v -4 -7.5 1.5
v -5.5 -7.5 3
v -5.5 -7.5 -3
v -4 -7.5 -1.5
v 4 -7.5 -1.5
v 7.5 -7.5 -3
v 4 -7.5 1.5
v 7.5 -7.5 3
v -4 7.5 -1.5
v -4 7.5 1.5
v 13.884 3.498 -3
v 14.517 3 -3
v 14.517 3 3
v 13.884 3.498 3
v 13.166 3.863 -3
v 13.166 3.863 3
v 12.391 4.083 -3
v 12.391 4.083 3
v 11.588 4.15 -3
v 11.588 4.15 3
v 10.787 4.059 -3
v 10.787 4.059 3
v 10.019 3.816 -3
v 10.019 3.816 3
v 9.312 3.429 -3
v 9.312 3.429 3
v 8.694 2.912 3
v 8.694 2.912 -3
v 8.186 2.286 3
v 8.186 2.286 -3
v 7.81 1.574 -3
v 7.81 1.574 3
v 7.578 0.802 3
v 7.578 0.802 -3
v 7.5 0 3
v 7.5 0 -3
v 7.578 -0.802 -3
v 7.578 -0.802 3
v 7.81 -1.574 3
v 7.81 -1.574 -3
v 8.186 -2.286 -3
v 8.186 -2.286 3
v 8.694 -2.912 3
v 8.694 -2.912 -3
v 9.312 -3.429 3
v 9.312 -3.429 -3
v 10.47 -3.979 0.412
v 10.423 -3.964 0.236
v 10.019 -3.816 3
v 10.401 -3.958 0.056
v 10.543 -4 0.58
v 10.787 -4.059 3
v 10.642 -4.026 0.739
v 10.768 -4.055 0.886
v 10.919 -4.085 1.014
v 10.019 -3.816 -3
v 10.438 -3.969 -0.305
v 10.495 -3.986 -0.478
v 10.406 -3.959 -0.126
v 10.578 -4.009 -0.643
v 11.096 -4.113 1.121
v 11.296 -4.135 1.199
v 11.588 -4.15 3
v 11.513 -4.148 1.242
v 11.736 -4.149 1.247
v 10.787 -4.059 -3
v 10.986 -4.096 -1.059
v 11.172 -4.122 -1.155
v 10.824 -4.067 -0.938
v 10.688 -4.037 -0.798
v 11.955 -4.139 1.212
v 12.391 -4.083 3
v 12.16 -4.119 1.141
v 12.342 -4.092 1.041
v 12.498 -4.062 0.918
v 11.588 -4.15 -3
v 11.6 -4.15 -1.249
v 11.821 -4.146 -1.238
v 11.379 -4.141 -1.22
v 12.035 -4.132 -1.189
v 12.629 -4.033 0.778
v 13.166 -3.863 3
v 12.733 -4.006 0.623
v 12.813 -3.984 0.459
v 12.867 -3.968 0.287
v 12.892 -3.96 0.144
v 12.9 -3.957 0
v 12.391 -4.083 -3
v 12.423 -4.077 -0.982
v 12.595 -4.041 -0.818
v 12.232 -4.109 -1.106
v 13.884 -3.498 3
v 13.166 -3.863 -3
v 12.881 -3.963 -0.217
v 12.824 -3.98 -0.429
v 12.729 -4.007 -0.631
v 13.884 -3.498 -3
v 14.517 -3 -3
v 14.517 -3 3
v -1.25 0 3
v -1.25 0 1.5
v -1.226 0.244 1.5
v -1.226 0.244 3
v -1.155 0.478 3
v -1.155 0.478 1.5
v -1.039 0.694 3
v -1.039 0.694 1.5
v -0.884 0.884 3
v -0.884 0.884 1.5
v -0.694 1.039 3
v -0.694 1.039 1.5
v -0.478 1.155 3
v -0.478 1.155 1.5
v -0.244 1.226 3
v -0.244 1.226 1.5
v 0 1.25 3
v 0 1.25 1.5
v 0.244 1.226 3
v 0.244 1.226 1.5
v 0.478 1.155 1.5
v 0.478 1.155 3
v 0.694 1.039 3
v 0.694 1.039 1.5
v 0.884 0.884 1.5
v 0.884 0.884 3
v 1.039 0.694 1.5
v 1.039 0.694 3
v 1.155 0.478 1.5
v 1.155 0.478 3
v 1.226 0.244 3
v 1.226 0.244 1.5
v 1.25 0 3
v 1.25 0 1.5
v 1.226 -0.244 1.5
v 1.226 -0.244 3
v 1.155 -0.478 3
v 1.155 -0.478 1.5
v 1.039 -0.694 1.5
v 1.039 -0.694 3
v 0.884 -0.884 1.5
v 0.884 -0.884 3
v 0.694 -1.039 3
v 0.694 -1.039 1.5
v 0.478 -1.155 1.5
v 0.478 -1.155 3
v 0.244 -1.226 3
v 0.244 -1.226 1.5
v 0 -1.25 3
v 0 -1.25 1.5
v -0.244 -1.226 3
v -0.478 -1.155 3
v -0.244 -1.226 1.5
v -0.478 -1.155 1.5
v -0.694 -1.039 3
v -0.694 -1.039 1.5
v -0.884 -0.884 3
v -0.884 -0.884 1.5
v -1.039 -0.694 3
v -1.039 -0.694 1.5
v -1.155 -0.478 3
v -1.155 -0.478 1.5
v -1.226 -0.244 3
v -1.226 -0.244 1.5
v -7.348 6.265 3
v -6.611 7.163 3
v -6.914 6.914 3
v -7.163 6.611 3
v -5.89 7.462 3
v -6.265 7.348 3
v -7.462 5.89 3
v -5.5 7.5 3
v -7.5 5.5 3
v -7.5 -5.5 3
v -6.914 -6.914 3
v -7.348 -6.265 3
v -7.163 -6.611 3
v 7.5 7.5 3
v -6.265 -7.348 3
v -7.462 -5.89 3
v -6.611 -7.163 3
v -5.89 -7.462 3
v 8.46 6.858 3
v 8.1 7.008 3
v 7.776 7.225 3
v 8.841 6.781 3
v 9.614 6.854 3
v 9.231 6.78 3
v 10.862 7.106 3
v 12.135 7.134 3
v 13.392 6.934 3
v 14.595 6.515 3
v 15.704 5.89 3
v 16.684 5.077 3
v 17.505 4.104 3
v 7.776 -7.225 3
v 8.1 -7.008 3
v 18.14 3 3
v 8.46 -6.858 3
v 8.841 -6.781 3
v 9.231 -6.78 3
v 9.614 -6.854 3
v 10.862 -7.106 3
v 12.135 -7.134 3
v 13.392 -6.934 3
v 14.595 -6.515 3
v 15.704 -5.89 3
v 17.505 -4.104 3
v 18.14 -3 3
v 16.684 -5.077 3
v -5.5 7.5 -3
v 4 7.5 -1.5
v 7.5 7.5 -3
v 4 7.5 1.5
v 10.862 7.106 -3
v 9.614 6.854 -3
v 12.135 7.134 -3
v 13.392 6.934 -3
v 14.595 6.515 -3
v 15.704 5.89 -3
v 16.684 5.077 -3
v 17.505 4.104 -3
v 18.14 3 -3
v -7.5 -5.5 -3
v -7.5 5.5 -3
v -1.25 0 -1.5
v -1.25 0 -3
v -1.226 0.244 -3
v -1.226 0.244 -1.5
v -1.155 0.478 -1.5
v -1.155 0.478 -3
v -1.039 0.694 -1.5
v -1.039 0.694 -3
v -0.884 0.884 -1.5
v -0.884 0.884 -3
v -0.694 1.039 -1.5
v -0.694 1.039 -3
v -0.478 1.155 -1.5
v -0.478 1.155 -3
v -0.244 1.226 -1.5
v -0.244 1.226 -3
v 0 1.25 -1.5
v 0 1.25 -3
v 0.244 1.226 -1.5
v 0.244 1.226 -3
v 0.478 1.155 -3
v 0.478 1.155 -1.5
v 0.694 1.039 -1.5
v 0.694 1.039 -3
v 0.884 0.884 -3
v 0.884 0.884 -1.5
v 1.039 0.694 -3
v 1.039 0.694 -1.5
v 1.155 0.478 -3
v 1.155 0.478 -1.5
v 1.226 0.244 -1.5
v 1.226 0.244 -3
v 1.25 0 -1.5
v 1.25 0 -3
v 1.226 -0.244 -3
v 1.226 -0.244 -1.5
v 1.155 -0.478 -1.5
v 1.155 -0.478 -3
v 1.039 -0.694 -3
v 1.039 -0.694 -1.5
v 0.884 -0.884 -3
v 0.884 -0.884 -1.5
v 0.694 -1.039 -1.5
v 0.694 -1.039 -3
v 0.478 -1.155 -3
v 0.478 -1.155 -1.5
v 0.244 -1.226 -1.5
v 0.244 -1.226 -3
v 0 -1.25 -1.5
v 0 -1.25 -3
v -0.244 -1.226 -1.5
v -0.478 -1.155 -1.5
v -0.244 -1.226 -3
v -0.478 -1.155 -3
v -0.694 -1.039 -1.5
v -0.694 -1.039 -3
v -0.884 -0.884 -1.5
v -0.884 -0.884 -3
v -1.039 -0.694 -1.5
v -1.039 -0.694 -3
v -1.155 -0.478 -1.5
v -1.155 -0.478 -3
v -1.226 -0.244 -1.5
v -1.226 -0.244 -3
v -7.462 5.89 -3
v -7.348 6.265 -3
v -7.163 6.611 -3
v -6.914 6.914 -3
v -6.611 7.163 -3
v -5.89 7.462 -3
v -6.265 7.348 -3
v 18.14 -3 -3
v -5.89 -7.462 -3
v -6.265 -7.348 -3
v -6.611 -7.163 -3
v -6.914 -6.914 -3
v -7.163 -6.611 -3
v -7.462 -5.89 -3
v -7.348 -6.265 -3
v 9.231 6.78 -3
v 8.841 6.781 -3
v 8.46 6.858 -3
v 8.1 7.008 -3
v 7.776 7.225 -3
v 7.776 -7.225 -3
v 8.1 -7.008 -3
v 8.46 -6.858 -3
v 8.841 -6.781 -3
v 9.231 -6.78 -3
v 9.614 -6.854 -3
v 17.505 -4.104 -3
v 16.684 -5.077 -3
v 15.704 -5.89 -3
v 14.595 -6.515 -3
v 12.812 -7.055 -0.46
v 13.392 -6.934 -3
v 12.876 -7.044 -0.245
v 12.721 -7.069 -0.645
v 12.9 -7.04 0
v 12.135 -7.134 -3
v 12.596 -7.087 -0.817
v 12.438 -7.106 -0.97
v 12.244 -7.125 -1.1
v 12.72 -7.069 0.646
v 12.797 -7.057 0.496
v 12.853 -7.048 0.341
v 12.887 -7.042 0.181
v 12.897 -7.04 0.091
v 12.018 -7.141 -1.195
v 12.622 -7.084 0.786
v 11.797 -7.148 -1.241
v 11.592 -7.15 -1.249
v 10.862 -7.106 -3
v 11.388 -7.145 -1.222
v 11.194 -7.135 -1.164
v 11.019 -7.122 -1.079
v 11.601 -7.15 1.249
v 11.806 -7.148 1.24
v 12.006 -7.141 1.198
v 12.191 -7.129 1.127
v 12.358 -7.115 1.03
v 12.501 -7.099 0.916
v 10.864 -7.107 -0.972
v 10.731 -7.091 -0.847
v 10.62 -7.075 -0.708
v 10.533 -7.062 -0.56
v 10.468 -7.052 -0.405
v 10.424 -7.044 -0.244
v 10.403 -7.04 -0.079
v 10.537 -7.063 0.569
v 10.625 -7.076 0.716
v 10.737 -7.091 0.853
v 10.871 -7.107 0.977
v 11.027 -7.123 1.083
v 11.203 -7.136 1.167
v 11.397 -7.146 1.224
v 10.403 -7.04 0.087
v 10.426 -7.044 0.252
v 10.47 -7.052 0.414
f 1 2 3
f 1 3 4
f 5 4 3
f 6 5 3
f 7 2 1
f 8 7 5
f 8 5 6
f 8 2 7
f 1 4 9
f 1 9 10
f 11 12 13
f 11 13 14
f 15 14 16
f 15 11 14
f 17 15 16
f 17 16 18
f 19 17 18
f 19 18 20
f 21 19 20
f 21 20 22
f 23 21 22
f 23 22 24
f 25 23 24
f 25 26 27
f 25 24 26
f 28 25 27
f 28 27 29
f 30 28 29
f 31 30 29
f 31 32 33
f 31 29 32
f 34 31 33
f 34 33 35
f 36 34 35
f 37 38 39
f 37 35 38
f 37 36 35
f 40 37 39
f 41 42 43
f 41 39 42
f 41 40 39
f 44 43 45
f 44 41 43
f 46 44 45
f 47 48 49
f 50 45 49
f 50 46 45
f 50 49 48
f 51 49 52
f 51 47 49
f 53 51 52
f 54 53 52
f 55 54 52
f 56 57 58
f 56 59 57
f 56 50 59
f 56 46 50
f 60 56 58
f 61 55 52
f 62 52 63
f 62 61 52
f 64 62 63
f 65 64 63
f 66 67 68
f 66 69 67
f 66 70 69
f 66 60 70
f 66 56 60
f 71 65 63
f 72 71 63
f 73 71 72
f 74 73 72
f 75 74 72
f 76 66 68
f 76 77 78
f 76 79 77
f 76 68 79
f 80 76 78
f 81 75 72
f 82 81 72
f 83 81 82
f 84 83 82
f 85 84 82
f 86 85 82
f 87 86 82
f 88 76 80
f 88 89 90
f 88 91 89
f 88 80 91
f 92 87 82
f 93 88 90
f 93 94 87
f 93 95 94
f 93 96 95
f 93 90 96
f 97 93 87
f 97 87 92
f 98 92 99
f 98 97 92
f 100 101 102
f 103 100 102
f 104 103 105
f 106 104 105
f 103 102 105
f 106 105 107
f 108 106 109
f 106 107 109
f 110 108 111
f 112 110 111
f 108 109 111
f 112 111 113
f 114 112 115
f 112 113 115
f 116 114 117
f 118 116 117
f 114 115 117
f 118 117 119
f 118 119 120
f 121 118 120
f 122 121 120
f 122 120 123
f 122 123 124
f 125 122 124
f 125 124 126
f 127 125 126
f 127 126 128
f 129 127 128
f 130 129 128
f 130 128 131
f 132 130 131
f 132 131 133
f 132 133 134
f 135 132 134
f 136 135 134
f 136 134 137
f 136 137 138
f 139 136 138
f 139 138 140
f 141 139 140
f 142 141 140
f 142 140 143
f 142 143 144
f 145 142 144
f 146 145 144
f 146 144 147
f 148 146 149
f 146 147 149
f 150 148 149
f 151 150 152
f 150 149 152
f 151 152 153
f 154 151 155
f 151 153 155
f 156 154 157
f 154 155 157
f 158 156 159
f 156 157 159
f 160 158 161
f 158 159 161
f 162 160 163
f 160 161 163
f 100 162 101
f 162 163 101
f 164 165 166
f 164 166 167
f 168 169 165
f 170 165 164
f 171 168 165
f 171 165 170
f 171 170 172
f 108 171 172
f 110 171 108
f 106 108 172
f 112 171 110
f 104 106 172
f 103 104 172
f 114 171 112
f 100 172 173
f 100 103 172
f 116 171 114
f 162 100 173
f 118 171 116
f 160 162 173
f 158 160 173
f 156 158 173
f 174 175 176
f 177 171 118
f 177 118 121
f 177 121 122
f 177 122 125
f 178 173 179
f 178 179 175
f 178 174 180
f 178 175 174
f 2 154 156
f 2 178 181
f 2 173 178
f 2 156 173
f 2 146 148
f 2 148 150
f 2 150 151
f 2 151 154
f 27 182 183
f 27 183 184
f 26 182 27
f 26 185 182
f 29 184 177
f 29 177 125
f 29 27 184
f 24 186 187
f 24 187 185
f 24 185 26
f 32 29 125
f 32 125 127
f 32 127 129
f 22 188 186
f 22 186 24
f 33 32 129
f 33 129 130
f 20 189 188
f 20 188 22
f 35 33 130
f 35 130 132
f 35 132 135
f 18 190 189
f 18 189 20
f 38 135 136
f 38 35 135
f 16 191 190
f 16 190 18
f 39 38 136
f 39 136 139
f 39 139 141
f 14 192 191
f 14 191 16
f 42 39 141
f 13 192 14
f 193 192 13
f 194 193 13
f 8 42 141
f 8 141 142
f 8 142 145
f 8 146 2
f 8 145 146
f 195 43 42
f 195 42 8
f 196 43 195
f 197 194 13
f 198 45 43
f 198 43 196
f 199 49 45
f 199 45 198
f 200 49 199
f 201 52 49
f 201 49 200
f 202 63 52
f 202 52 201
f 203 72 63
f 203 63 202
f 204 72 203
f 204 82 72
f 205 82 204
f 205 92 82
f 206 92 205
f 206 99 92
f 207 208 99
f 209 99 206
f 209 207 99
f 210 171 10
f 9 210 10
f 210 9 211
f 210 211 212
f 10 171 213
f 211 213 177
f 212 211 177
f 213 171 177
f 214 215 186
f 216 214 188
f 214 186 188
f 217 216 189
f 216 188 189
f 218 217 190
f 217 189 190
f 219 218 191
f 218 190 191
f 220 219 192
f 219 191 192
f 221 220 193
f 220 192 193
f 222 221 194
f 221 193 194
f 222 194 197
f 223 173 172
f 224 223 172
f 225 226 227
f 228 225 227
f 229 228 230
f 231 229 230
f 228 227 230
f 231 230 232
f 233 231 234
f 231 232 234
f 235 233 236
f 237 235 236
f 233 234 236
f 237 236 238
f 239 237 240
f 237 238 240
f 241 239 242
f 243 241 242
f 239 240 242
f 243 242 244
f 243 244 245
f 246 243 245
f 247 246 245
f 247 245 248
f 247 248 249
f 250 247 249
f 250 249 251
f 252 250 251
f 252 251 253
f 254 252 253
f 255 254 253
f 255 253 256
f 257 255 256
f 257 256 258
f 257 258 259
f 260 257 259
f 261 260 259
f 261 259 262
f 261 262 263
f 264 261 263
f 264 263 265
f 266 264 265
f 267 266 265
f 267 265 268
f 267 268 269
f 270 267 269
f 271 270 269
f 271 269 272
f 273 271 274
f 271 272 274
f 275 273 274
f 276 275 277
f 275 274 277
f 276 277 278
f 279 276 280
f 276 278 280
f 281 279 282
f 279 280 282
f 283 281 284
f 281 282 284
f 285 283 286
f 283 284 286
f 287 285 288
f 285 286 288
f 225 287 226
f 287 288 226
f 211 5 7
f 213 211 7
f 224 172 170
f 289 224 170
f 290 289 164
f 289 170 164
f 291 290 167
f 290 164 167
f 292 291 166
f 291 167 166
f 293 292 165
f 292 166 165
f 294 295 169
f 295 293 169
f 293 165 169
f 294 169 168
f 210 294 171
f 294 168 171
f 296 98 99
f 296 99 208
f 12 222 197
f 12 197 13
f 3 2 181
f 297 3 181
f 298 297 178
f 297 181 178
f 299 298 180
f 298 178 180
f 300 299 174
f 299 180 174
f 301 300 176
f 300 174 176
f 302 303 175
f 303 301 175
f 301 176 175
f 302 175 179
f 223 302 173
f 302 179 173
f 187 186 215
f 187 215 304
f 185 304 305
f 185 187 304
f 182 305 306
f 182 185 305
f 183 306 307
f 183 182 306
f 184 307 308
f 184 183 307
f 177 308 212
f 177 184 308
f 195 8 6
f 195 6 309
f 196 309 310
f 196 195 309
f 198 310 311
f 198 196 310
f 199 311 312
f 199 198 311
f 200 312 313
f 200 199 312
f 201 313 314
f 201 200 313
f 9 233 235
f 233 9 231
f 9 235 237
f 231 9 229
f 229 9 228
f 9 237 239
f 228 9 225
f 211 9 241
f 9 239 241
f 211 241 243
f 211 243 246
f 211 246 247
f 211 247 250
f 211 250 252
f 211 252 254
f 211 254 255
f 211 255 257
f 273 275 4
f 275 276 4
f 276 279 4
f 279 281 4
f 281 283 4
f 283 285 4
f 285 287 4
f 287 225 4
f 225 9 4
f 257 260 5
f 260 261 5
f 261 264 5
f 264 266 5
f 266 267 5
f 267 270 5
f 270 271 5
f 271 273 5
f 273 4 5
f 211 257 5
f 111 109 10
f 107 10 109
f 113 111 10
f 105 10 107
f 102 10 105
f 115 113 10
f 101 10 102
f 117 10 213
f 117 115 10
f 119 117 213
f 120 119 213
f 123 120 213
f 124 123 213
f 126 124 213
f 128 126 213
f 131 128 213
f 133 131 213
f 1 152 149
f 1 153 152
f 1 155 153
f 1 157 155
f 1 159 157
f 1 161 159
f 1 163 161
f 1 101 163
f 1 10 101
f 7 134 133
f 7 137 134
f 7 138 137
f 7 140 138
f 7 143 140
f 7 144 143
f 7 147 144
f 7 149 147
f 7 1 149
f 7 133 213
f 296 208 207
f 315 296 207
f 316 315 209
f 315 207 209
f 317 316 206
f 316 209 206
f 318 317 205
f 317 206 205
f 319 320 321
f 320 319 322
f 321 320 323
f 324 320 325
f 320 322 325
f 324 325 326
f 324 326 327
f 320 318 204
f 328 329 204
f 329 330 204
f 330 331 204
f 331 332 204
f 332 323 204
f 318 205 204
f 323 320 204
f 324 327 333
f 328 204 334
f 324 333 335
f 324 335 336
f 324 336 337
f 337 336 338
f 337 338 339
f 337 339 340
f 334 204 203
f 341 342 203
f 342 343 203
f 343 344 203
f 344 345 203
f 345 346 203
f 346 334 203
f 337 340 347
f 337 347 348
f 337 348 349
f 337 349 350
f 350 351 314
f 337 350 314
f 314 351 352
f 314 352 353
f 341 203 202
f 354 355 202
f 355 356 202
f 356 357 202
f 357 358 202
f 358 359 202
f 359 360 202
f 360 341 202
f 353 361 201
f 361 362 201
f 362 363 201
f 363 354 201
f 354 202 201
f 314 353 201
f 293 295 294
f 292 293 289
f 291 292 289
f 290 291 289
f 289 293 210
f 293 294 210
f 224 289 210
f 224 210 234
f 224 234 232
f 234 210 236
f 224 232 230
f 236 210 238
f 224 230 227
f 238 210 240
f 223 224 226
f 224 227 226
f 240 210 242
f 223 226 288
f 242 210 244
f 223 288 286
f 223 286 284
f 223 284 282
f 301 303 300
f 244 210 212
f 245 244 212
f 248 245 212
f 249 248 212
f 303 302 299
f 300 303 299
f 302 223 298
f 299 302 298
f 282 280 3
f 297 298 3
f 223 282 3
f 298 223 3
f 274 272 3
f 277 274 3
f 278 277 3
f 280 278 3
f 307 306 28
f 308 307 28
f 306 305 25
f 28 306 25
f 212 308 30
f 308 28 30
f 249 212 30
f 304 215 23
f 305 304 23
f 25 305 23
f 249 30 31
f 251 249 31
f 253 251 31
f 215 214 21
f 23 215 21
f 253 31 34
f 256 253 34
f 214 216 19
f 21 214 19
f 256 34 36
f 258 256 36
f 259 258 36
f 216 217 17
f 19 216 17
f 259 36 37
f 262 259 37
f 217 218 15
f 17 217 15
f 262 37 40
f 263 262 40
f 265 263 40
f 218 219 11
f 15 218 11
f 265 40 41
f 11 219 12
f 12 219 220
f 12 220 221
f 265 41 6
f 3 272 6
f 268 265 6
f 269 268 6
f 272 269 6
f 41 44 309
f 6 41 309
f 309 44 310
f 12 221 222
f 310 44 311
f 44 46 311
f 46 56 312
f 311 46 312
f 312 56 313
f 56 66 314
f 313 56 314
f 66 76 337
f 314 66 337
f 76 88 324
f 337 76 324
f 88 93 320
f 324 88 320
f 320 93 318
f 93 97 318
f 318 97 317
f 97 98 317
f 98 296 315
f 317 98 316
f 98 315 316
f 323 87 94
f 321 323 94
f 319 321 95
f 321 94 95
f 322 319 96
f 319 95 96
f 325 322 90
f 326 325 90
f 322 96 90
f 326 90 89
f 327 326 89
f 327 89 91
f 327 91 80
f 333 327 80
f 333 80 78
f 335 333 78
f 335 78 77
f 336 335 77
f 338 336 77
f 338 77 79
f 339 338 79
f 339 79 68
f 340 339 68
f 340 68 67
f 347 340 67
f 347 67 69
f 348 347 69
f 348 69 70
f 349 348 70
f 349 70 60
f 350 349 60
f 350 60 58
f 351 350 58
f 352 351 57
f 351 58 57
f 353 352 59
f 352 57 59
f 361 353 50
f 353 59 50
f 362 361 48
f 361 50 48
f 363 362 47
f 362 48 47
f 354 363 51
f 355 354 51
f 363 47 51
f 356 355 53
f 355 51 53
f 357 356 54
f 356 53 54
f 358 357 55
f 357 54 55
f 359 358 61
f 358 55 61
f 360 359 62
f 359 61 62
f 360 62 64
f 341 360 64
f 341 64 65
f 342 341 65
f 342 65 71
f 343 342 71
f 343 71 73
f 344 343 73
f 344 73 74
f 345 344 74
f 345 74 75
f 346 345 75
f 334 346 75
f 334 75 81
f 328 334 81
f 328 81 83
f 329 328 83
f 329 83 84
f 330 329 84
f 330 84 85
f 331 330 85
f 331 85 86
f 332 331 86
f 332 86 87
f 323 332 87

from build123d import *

# Parameters (mm, degrees)
SKETCH1_W                 = 15
SKETCH1_H                 = 15
BOSS_EXTRUDE1_DEPTH       = 3
SKETCH2_W                 = 8
SKETCH2_H                 = 3
CUT_EXTRUDE1_DEPTH        = 18.036725037
BOSS_EXTRUDE2_DEPTH       = 6
FILLET1_R                 = 2
CUT_EXTRUDE2_DEPTH        = 22.111371343
M3X0_5_TAPPED_HOLE1_D     = 2.5
M3X0_5_TAPPED_HOLE1_DEPTH = 7.5
M3X0_5_TAPPED_HOLE1_TIP   = 0.751075774
M3X0_5_TAPPED_HOLE2_D     = 2.5
M3X0_5_TAPPED_HOLE2_DEPTH = 7.5
M3X0_5_TAPPED_HOLE2_TIP   = 0.751075774


with BuildPart() as part:
    # Sketch1 → Boss-Extrude1 (new, symmetric)
    with BuildSketch(Plane.XY):
        Rectangle(SKETCH1_W, SKETCH1_H)
    extrude(amount=BOSS_EXTRUDE1_DEPTH, both=True)

    # Sketch2 → Cut-Extrude1 (cut, through all)
    with BuildSketch(Plane.XZ.offset(7.5)):
        Rectangle(SKETCH2_W, SKETCH2_H)
    extrude(amount=-CUT_EXTRUDE1_DEPTH, mode=Mode.SUBTRACT)

    # Sketch3 → Boss-Extrude2 (add)
    with BuildSketch(Plane.XY.offset(3)):
        with BuildLine():
            Line((7.5, -5.822370651), (7.5, 5.822370651))
            ThreePointArc((7.5, 5.822370651), (18.8, 0), (7.5, -5.822370651))
        make_face()
    extrude(amount=-BOSS_EXTRUDE2_DEPTH)

    # Fillet1
    # the kernel refuses this fillet: 2 mm, written as the material it adds along each edge
    with BuildSketch(Plane(origin=(7.5, -5.822370651, 3), x_dir=(0, -1, 0), z_dir=(0, 0, -1))) as fillet1_piece_1:
        with BuildLine():
            CenterArc((2.948715205, -1.544131065), FILLET1_R, 129.460264065, 67.086296359)
            ThreePointArc((1.031537969, -2.113719903), (0.603278499, -1.014153543), (0, 0))
            Line((0, 0), (1.677629349, 0))
        make_face()
    extrude(amount=6)
    with BuildSketch(Plane(origin=(7.5, 5.822370651, 3), x_dir=(0, 1, 0), z_dir=(0, 0, -1))) as fillet1_piece_2:
        with BuildLine():
            CenterArc((2.948715205, 1.544131065), FILLET1_R, 163.453439576, 67.086296359)
            ThreePointArc((1.031537969, 2.113719903), (0.603278499, 1.014153543), (0, 0))
            Line((0, 0), (1.677629349, 0))
        make_face()
    extrude(amount=6)
    # the kernel refuses this fillet: 2 mm, written as the material it takes off along each edge
    with BuildSketch(Plane(origin=(-7.5, -7.5, 8), x_dir=(1, 0, 0), z_dir=(0, 0, -1)), Plane(origin=(-7.5, 7.5, 8), x_dir=(0, -1, 0), z_dir=(0, 0, -1))) as fillet1_2_piece_1:
        with BuildLine():
            CenterArc((FILLET1_R, -FILLET1_R), FILLET1_R, 90, 90)
            Line((0, -FILLET1_R), (0, 0))
            Line((0, 0), (FILLET1_R, 0))
        make_face()
    extrude(amount=16, mode=Mode.SUBTRACT)

    # Sketch4 → Cut-Extrude2 (cut, through all)
    with BuildSketch(Plane(origin=(0, 0, -3), x_dir=(-1, 0, 0), z_dir=(0, 0, -1))):
        with BuildLine():
            Line((-18.8, 3), (-14.517490192, 3))
            ThreePointArc((-14.517490192, 3), (-7.5, 0), (-14.517490192, -3))
            Line((-14.517490192, -3), (-18.8, -3))
            Line((-18.8, -3), (-18.8, 3))
        make_face()
    extrude(amount=-CUT_EXTRUDE2_DEPTH, mode=Mode.SUBTRACT)

    # M3x0.5 Tapped Hole1
    with Locations(Plane(origin=(0, -7.5, 0), x_dir=(-1, 0, 0), z_dir=(0, -1, 0))):
        with Locations((-11.65, 0)):
            Hole(M3X0_5_TAPPED_HOLE1_D / 2, depth=M3X0_5_TAPPED_HOLE1_DEPTH)
            with Locations((0, 0, -(M3X0_5_TAPPED_HOLE1_DEPTH + M3X0_5_TAPPED_HOLE1_TIP / 2))):  # 118° drill point
                Cone(0, M3X0_5_TAPPED_HOLE1_D / 2, M3X0_5_TAPPED_HOLE1_TIP, mode=Mode.SUBTRACT)

    # M3x0.5 Tapped Hole2
    with Locations(Plane.XY.offset(3)):
        with Locations((0, 0)):
            Hole(M3X0_5_TAPPED_HOLE2_D / 2, depth=M3X0_5_TAPPED_HOLE2_DEPTH)
            with Locations((0, 0, -(M3X0_5_TAPPED_HOLE2_DEPTH + M3X0_5_TAPPED_HOLE2_TIP / 2))):  # 118° drill point
                Cone(0, M3X0_5_TAPPED_HOLE2_D / 2, M3X0_5_TAPPED_HOLE2_TIP, mode=Mode.SUBTRACT)


solid = part.part
